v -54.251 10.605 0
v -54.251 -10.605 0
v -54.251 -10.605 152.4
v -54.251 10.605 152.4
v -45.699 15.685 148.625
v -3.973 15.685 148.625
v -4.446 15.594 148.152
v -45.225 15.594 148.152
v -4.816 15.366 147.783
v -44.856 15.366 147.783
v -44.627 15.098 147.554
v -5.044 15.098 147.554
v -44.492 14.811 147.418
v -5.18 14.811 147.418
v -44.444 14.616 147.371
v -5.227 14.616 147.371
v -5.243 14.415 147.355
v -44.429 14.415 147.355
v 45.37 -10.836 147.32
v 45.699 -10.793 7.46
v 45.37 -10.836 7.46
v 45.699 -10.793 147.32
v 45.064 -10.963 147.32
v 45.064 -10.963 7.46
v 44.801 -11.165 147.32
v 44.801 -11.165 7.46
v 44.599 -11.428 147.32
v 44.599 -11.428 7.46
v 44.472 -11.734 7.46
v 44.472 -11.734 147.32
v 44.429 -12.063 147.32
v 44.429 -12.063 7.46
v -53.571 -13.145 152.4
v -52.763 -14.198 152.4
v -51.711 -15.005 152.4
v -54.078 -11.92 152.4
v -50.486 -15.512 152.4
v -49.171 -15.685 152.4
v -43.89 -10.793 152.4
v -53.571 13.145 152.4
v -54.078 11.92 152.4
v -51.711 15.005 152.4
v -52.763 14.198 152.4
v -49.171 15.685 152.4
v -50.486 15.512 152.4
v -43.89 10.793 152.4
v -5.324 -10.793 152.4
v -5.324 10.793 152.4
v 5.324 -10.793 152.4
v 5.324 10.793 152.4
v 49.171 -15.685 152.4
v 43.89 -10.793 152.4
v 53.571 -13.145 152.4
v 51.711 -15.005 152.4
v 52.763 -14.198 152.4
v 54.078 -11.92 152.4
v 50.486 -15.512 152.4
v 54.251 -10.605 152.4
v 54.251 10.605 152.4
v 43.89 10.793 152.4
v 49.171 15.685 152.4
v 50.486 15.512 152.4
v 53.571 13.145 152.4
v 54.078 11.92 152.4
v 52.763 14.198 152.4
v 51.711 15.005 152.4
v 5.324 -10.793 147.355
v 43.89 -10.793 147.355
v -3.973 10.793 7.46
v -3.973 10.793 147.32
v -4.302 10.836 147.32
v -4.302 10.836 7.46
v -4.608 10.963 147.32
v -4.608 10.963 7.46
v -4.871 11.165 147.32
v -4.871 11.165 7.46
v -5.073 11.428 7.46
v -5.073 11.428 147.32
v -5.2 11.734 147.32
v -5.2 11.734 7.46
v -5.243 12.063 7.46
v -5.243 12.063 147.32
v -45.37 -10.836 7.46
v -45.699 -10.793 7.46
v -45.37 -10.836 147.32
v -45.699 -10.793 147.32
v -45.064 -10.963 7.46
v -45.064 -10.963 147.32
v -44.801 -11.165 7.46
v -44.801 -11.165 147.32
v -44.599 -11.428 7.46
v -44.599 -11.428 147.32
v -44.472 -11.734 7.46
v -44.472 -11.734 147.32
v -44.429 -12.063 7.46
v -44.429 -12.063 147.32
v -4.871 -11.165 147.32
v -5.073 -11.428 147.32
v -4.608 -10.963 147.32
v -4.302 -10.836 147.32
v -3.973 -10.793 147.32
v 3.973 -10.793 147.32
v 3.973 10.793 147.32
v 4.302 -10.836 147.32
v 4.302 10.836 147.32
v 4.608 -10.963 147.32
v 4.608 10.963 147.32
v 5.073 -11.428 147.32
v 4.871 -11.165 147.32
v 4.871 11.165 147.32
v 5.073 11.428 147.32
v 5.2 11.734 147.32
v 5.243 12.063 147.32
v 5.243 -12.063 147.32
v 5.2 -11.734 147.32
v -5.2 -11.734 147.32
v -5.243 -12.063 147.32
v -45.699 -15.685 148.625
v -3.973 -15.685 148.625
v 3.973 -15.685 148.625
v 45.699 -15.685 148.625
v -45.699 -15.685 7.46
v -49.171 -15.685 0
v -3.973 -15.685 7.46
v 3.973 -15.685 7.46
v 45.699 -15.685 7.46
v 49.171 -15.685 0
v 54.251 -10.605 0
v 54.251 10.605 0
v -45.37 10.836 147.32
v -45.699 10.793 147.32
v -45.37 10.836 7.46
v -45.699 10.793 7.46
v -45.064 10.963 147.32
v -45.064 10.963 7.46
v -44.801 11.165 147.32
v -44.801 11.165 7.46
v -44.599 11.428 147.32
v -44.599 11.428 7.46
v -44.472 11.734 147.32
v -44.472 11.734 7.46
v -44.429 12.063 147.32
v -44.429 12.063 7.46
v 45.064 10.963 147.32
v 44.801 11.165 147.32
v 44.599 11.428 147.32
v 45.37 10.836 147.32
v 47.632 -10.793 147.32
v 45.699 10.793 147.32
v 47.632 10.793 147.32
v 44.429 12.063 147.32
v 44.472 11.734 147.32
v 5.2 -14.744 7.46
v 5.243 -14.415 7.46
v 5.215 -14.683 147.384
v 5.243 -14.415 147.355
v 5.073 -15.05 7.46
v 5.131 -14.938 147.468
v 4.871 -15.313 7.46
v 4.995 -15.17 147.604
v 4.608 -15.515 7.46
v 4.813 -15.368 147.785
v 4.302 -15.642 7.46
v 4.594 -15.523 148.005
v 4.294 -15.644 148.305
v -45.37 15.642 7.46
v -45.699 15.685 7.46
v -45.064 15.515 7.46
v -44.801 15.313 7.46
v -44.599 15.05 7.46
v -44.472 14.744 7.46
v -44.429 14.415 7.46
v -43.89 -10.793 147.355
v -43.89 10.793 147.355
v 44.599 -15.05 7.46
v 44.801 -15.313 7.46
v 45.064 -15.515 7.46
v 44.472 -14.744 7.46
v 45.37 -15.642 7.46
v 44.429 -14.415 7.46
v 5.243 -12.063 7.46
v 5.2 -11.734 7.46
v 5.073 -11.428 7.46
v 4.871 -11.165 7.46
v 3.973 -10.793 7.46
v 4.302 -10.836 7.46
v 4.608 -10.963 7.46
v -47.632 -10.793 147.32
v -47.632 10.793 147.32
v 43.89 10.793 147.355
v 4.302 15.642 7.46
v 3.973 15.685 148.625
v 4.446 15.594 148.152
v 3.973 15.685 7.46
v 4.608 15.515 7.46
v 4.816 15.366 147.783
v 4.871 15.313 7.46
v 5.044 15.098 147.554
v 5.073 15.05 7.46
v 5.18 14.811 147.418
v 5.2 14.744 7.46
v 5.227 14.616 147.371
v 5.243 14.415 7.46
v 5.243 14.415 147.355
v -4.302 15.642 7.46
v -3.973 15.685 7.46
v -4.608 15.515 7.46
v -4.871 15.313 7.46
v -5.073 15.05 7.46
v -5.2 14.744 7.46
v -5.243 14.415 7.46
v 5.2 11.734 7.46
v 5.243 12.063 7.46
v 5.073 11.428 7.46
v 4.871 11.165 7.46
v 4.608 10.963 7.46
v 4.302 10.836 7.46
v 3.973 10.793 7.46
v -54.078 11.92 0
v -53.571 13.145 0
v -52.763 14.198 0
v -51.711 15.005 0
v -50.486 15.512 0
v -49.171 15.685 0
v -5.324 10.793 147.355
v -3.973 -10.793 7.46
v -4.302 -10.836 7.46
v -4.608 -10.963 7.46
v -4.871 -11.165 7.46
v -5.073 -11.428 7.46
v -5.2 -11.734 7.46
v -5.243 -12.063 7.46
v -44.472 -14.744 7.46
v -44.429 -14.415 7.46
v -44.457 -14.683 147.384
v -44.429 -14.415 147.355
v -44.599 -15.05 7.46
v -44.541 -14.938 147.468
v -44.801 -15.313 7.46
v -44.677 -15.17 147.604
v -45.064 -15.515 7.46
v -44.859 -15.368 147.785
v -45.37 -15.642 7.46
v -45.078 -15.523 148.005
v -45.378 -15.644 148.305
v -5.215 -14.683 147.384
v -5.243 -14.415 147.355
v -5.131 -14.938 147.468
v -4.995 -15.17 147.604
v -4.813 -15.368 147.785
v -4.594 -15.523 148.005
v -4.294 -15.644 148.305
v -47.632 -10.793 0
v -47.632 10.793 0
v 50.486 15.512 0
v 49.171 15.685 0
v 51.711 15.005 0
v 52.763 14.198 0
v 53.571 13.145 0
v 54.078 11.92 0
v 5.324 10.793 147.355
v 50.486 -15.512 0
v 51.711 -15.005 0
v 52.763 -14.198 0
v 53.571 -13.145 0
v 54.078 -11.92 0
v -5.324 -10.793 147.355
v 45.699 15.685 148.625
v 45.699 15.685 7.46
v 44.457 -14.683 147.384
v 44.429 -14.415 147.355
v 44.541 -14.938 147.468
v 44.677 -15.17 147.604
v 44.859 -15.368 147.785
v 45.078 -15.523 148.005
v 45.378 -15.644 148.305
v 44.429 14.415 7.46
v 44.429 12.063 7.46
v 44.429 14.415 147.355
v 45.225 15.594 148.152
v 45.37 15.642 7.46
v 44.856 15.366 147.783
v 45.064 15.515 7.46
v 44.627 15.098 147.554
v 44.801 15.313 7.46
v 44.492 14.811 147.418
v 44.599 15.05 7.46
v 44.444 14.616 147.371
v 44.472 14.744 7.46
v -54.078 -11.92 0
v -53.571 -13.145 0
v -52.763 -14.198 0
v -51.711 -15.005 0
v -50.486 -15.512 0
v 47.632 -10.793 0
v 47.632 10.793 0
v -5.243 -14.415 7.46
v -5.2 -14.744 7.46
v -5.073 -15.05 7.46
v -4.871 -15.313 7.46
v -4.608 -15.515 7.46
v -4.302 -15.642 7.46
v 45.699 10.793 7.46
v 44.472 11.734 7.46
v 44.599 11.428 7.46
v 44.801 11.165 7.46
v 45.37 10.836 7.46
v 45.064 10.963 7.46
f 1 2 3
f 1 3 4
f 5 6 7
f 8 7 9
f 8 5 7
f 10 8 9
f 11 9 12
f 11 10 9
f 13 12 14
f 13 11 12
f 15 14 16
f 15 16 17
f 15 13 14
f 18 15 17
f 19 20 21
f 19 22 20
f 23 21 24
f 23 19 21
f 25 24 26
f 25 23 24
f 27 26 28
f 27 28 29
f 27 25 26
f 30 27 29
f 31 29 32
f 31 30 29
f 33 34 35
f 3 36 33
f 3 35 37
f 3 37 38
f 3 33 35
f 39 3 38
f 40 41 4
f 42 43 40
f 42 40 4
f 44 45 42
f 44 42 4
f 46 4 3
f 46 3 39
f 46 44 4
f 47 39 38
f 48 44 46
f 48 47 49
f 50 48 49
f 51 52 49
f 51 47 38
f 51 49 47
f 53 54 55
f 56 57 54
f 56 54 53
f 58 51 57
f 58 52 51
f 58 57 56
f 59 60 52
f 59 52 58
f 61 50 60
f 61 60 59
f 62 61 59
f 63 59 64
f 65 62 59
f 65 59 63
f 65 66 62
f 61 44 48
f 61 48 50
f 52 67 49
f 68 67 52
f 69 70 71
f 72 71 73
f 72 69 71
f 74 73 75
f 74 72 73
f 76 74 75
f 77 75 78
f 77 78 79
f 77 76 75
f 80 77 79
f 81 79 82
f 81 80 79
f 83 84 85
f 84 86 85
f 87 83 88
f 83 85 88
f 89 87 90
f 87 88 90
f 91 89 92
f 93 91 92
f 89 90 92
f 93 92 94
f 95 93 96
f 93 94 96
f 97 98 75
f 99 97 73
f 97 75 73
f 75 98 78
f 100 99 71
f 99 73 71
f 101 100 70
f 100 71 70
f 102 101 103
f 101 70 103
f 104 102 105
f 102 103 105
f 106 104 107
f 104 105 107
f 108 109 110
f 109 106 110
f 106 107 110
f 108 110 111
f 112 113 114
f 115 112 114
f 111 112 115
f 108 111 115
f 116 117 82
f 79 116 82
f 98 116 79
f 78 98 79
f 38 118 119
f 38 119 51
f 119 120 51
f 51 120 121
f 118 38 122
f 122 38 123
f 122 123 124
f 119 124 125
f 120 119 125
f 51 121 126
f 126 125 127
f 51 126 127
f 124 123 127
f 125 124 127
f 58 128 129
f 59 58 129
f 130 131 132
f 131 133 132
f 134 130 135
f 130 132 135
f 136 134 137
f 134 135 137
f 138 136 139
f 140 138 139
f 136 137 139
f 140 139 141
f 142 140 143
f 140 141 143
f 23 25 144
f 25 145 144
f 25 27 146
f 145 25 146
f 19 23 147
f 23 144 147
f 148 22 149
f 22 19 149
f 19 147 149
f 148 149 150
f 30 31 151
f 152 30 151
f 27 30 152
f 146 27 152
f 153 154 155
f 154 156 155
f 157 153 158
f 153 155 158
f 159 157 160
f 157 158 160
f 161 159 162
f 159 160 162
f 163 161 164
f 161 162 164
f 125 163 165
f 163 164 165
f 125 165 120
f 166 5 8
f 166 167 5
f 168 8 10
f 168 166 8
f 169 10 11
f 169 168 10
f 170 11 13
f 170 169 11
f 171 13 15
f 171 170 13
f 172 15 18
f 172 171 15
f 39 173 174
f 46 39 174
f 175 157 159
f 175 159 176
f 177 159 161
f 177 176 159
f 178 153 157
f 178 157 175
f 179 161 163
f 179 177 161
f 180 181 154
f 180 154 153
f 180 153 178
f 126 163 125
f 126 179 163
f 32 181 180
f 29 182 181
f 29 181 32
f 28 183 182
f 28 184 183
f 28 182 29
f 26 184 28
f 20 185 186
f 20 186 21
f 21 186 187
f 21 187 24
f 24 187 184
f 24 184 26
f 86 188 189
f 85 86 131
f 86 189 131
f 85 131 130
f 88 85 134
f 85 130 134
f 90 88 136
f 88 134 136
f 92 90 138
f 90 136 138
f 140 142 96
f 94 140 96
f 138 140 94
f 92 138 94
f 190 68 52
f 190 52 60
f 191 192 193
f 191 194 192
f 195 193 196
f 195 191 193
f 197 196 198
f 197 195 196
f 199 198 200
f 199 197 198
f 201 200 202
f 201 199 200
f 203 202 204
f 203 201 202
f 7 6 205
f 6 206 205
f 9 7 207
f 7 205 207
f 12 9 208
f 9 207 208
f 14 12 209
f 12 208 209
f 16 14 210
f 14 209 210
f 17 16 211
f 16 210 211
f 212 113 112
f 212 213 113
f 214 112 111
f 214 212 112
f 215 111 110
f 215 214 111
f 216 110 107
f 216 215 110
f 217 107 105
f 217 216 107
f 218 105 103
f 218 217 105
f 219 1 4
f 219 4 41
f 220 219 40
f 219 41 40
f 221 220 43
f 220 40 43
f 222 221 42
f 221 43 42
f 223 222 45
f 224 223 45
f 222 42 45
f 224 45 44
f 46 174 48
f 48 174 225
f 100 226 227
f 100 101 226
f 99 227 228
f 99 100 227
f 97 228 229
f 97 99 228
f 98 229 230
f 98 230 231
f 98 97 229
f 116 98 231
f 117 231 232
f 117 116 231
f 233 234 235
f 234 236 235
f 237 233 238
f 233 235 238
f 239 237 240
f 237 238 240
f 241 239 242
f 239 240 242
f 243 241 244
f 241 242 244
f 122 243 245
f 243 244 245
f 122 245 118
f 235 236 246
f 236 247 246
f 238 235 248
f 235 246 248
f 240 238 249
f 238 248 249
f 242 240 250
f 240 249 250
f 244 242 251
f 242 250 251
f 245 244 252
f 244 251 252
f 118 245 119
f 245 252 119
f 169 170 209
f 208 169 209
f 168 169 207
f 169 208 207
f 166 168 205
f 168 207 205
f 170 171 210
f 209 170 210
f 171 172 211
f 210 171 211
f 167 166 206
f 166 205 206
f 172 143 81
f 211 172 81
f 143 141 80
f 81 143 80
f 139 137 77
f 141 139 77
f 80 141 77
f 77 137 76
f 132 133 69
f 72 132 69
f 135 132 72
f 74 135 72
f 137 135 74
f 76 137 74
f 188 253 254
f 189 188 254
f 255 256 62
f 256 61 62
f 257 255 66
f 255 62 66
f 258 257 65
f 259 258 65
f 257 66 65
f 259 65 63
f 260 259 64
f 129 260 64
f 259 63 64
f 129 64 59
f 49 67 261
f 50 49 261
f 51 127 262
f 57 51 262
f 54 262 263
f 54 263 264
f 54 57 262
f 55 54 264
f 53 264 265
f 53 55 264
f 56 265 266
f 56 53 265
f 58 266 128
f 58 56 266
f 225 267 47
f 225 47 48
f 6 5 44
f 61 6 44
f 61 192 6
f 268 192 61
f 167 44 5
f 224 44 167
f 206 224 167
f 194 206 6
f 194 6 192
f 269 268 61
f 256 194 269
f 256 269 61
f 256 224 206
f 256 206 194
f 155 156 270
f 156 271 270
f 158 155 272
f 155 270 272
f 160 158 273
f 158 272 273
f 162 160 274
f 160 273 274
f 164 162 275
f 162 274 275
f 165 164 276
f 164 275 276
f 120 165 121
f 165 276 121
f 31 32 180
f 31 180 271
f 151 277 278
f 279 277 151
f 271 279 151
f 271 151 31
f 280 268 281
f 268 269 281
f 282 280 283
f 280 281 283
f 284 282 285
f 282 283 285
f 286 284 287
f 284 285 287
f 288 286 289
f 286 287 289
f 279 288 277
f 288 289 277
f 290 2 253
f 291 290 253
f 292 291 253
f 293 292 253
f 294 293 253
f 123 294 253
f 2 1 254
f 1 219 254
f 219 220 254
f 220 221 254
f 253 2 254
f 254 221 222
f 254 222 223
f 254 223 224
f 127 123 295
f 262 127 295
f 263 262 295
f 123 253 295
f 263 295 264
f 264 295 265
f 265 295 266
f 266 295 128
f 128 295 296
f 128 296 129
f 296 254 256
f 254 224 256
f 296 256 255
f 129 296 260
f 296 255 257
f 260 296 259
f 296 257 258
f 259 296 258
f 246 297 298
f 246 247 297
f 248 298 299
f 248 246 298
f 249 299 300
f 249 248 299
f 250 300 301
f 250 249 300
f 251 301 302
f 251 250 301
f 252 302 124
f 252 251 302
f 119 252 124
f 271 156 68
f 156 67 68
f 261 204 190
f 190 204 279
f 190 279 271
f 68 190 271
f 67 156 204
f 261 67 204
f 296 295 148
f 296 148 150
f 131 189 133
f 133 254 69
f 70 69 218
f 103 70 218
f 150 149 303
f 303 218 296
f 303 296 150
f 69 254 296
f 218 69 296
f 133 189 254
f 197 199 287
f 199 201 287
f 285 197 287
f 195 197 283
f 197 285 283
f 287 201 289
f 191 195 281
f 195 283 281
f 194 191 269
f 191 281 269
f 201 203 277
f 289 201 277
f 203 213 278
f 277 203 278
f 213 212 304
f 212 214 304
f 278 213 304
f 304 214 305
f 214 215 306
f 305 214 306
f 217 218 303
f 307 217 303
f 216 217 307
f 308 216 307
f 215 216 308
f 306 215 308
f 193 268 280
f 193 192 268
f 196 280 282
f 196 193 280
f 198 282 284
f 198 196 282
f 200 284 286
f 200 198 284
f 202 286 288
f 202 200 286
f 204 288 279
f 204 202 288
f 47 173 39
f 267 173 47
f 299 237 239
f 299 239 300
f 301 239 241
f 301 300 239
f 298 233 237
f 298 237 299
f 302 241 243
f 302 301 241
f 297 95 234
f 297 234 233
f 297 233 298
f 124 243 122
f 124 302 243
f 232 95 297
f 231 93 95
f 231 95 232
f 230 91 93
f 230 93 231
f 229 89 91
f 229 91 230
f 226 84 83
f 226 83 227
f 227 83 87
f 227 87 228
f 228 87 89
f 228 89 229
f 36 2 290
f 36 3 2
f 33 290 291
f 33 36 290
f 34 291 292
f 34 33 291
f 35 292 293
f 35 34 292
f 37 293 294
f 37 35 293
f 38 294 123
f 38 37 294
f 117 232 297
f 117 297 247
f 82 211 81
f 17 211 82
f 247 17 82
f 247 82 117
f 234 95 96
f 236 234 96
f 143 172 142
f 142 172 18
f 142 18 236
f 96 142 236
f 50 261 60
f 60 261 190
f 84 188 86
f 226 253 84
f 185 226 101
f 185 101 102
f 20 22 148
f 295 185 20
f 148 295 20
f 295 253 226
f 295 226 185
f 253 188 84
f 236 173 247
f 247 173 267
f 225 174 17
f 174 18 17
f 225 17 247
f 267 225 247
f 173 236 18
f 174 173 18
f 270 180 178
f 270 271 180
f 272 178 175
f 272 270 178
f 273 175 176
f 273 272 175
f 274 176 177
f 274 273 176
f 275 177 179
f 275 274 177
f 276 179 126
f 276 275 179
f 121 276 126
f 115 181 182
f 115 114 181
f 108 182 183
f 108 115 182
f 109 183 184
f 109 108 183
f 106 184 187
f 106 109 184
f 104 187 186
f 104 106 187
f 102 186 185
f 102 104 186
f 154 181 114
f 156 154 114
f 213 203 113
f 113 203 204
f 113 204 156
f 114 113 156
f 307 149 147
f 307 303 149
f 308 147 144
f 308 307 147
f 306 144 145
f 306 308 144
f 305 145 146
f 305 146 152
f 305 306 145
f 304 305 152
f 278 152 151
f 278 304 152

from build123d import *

# Parameters (mm, degrees)
F0_W          = 108.5027605295
F0_H          = 31.3708260655
F1_DEPTH      = 152.4
F2_W          = 95.2637046576
F2_H          = 21.5854328126
F3_DEPTH      = 147.32
F4_R          = 5.08
F5_W          = 39.1854047775
F5_H          = 139.895003289
F6_DEPTH      = 15.6864130328
F6_DEPTH_BACK = 15.6864130328
F7_R          = 1.27
F8_W          = 38.5659714229
F8_H          = 21.5854328126
F9_DEPTH      = 152.401


with BuildPart() as f1:
    # F0 (on Top) → F1 (new body)
    with BuildSketch(Plane.XY):
        Rectangle(F0_W, F0_H)
    extrude(amount=F1_DEPTH)

    # F2 (on Top) → F3 (cut)
    with BuildSketch(Plane.XY):
        Rectangle(F2_W, F2_H)
    extrude(amount=F3_DEPTH, mode=Mode.SUBTRACT)

    # F4
    f4_edges = [f1.edges().sort_by_distance(p)[0] for p in [
        (-54.25138, 15.685413, 76.2),
        (-54.25138, -15.685413, 76.2),
        (54.25138, -15.685413, 76.2),
        (54.25138, 15.685413, 76.2),
    ]]
    fillet(f4_edges, radius=F4_R)

    # F5 (on Front) → F6 (cut, two sides)
    with BuildSketch(Plane.XZ) as f6_sk:
        with Locations((24.835858494, 77.4077717215)):
            Rectangle(F5_W, F5_H)
        with Locations((-24.835858494, 77.4077717215)):
            Rectangle(F5_W, F5_H)
    extrude(amount=-F6_DEPTH, mode=Mode.SUBTRACT)
    extrude(f6_sk.sketch, amount=F6_DEPTH_BACK, mode=Mode.SUBTRACT)

    # F7
    f7_edges = [f1.edges().sort_by_distance(p)[0] for p in [
        (5.243156, -15.685413, 77.407772),
        (5.243156, -10.792716, 77.390135),
        (-5.243156, -15.685413, 77.407772),
        (-5.243156, -10.792716, 77.390135),
        (-5.243156, 10.792716, 77.390135),
        (-5.243156, 15.685413, 77.407772),
        (5.243156, 10.792716, 77.390135),
        (5.243156, 15.685413, 77.407772),
        (44.428561, -15.685413, 77.407772),
        (44.428561, -10.792716, 77.390135),
        (44.428561, 10.792716, 77.390135),
        (44.428561, 15.685413, 77.407772),
        (-44.428561, 10.792716, 77.390135),
        (-44.428561, 15.685413, 77.407772),
        (-44.428561, -10.792716, 77.390135),
        (-44.428561, -15.685413, 77.407772),
        (-24.835858, 15.685413, 147.355273),
        (-24.835858, -15.685413, 147.355273),
        (24.835858, -15.685413, 147.355273),
        (24.835858, 15.685413, 147.355273),
    ]]
    fillet(f7_edges, radius=F7_R)

    # F8 (on Top) → F9 (cut, through all)
    with BuildSketch(Plane.XY):
        with Locations((-24.6073936578, 0)):
            Rectangle(F8_W, F8_H)
        with Locations((24.6073936578, 0)):
            Rectangle(F8_W, F8_H)
    extrude(amount=F9_DEPTH, mode=Mode.SUBTRACT)


solid = f1.part
